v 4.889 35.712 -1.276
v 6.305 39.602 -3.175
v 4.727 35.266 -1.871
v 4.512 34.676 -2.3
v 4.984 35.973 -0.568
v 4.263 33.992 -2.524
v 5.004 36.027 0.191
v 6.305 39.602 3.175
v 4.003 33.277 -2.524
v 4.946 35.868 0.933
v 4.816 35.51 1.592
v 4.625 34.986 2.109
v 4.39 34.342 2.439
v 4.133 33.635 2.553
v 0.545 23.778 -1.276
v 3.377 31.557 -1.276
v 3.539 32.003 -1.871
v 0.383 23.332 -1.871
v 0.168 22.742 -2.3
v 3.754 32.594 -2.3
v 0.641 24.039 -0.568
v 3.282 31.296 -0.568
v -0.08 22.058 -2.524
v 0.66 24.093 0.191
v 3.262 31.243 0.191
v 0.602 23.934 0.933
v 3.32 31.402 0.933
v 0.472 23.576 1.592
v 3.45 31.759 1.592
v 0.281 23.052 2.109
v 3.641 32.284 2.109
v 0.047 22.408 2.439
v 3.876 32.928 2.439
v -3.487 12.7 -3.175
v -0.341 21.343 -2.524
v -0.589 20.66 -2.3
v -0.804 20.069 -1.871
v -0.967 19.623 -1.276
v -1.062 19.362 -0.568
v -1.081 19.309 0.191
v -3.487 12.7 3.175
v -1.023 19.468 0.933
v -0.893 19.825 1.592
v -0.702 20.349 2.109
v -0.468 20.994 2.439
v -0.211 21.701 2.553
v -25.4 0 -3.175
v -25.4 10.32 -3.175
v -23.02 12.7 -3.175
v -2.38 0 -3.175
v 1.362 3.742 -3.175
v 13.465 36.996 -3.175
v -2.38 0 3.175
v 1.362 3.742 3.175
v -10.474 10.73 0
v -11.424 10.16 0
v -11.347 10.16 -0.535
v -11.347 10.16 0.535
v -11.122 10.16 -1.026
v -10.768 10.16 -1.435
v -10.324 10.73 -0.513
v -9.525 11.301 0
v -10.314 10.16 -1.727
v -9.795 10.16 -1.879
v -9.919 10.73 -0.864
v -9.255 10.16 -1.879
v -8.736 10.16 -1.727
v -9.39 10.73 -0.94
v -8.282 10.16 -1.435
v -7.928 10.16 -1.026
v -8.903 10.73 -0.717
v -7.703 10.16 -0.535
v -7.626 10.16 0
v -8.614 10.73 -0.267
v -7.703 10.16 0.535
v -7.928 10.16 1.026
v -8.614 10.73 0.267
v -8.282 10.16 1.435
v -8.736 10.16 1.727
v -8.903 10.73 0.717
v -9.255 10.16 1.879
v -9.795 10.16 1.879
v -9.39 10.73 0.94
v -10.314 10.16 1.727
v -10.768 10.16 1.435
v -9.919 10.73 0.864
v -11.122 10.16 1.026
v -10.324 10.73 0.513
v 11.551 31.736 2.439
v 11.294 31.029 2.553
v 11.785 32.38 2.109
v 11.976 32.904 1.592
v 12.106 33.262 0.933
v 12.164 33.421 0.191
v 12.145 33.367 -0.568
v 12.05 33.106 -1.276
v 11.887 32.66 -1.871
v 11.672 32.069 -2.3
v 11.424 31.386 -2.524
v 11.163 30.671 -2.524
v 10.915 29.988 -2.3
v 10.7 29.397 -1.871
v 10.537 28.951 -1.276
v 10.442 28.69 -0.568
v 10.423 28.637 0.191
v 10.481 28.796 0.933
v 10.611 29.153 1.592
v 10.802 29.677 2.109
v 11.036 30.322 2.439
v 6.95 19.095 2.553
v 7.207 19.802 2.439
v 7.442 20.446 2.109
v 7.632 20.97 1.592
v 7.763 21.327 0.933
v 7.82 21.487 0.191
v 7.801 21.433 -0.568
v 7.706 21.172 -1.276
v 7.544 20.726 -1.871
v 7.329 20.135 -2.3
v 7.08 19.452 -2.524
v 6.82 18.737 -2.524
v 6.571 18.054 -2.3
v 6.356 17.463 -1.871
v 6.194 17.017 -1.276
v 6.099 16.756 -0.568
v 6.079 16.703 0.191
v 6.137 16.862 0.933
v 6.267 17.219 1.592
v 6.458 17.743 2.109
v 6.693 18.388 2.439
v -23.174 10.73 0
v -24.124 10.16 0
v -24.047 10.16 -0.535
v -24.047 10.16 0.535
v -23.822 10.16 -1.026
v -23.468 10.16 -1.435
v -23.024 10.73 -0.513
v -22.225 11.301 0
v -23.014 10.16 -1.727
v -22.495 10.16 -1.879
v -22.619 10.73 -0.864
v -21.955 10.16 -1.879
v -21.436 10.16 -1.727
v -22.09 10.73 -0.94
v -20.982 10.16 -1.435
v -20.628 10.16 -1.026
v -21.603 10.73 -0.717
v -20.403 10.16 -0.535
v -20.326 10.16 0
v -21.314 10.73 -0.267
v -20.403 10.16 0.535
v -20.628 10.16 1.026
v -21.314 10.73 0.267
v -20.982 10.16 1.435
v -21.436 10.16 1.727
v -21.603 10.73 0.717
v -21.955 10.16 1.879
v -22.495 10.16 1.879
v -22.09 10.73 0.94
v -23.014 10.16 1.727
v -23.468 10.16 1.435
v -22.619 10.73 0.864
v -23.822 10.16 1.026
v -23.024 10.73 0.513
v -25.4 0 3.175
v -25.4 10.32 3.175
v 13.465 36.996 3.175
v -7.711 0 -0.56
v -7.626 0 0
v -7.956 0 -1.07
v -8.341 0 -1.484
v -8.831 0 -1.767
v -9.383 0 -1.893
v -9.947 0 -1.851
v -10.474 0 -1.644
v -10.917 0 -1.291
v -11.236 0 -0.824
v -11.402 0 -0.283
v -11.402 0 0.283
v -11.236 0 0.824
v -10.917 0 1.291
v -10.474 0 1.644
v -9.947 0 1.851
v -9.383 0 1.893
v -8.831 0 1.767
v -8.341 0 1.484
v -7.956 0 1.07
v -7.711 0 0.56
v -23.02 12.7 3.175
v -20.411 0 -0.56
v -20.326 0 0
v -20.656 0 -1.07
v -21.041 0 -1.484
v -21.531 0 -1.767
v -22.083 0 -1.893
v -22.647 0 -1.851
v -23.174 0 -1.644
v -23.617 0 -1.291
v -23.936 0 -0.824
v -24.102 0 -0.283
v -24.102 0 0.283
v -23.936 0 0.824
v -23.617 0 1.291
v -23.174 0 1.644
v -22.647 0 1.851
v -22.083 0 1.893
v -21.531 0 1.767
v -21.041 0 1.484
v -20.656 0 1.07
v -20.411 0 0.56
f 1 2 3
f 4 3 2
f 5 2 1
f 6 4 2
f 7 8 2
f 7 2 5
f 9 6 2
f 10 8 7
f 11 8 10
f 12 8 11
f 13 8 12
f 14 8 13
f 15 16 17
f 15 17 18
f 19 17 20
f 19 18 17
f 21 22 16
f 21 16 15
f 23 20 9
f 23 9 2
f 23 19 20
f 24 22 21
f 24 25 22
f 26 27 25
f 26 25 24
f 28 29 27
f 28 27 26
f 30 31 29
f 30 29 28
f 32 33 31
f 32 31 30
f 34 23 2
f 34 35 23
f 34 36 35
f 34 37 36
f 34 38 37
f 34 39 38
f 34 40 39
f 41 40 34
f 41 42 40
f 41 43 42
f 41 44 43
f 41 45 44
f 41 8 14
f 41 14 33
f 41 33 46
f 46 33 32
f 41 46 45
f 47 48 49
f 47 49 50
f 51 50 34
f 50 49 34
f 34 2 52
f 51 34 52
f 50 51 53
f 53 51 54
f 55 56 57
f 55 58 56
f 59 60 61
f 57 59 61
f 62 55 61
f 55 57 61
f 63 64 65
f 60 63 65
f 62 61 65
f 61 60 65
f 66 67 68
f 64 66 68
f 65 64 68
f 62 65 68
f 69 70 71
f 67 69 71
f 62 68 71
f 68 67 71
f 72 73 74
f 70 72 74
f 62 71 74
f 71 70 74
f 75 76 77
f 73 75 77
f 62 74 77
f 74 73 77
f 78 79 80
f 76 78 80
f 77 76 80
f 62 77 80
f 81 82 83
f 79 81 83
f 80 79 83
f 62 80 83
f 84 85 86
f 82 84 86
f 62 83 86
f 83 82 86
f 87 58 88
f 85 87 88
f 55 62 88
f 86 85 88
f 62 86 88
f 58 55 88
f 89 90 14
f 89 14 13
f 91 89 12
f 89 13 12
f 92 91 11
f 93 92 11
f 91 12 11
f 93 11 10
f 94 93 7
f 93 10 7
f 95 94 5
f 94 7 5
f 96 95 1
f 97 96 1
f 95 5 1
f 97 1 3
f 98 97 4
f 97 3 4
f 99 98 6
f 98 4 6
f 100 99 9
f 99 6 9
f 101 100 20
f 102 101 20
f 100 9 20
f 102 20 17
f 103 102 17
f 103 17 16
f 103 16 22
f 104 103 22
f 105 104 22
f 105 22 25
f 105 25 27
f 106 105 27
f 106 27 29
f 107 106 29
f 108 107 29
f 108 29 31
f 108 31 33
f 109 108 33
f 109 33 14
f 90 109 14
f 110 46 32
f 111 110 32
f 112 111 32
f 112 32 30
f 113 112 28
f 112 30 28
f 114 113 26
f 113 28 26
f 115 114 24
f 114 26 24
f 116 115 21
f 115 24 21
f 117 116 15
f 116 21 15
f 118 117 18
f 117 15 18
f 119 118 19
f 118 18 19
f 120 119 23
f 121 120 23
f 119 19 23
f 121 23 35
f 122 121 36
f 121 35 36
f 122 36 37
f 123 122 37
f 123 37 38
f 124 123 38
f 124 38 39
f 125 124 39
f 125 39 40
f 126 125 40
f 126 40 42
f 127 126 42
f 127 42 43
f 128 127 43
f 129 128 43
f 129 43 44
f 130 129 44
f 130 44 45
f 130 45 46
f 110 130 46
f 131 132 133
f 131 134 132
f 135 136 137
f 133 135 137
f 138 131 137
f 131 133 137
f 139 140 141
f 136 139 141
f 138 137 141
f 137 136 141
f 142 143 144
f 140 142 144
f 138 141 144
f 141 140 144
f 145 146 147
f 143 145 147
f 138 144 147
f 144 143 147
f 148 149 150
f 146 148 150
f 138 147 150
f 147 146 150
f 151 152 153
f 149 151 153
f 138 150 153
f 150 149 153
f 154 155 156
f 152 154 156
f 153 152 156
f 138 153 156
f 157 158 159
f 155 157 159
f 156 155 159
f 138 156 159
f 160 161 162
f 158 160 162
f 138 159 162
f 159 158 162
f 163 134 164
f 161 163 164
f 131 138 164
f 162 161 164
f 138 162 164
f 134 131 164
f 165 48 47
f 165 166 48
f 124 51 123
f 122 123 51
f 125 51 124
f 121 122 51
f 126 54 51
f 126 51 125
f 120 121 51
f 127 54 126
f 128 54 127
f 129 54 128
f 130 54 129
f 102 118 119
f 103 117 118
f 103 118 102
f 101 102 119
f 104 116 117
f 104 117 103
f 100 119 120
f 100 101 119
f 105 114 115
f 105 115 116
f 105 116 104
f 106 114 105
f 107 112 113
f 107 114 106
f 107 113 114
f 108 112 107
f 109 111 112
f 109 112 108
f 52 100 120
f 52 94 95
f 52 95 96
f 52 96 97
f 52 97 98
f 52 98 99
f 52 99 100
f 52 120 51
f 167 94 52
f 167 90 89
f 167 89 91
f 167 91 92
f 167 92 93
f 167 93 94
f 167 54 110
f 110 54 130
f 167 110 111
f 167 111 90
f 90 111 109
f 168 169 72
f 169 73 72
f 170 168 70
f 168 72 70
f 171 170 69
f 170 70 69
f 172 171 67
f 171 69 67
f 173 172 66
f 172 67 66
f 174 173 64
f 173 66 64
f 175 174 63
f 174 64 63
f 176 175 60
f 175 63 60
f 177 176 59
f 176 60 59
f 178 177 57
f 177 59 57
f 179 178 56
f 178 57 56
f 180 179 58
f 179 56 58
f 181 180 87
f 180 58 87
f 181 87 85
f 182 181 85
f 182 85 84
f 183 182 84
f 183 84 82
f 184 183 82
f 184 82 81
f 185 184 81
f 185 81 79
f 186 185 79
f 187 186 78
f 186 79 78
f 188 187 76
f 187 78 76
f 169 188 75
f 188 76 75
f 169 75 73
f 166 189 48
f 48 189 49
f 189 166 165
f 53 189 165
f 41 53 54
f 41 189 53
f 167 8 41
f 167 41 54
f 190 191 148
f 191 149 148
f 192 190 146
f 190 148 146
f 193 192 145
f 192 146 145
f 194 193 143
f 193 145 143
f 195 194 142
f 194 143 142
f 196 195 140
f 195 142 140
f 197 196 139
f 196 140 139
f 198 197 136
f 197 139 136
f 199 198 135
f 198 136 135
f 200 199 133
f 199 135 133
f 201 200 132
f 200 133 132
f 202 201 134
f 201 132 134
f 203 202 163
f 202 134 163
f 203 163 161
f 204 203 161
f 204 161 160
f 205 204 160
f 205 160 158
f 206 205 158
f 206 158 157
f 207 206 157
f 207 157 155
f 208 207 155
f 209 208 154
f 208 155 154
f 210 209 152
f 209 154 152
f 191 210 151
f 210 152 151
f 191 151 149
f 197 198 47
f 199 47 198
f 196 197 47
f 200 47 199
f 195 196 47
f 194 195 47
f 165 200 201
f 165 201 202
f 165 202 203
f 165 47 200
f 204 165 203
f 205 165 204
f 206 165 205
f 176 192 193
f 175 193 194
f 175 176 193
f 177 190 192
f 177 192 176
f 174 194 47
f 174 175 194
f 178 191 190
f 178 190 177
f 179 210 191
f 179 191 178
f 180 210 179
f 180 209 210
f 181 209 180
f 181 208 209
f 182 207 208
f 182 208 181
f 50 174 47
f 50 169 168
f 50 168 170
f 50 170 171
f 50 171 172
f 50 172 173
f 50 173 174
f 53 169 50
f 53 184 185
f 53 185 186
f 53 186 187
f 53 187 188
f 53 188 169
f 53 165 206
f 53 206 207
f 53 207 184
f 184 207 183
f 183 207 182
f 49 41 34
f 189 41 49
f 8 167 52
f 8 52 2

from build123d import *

# Parameters (mm, degrees)
BOSS_EXTRUDE1_DEPTH            = 3.175
TAP_DRILL_FOR_10_24_TAP1_D     = 3.7973
TAP_DRILL_FOR_10_24_TAP1_DEPTH = 10.16
TAP_DRILL_FOR_10_24_TAP1_TIP   = 1.140824014
CHAMFER1_SIZE                  = 2.38
CHAMFER1_EDGE_2_SIZE2          = 3.982114101
CHAMFER1_EDGE_2_SIZE           = 2.38
F_10_CLEARANCE_HOLE1_D         = 5.1054
F_10_CLEARANCE_HOLE1_DEPTH     = 12.7
F_10_CLEARANCE_HOLE1_TIP       = 1.533816902


with BuildPart() as part:
    # Sketch1 → Boss-Extrude1 (new body, symmetric)
    with BuildSketch(Plane.XY):
        Polygon((-25.4, 0), (0, 0), (13.465333043, 36.99569848), (6.304875272, 39.601891972), (-3.486612651, 12.7), (-25.4, 12.7), align=None)
    extrude(amount=BOSS_EXTRUDE1_DEPTH, both=True)

    # Tap Drill for #10-24 Tap1
    with Locations(Plane(origin=(0, 0, 0), x_dir=(-1, 0, 0), z_dir=(0, -1, 0))):
        with Locations((22.225, 0), (9.525, 0)):
            Hole(TAP_DRILL_FOR_10_24_TAP1_D / 2, depth=TAP_DRILL_FOR_10_24_TAP1_DEPTH)
            with Locations((0, 0, -(TAP_DRILL_FOR_10_24_TAP1_DEPTH + TAP_DRILL_FOR_10_24_TAP1_TIP / 2))):  # 118° drill point
                Cone(0, TAP_DRILL_FOR_10_24_TAP1_D / 2, TAP_DRILL_FOR_10_24_TAP1_TIP, mode=Mode.SUBTRACT)

    # Chamfer1
    chamfer1_edges = [part.edges().sort_by_distance(p)[0] for p in [
        (-25.4, 12.7, 0),
    ]]
    chamfer(chamfer1_edges, length=CHAMFER1_SIZE)

    # Chamfer1 edge 2
    chamfer1_edge_2_edges = [part.edges().sort_by_distance(p)[0] for p in [
        (0, 0, 0),
    ]]
    chamfer(chamfer1_edge_2_edges, length=CHAMFER1_EDGE_2_SIZE, length2=CHAMFER1_EDGE_2_SIZE2)

    # #10 Clearance Hole1
    with Locations(Plane(origin=(0, 0, 0), x_dir=(0, 0, -1), z_dir=(0.939692621, -0.342020143, 0))):
        with Locations((0, 33.02), (0, 20.32)):
            Hole(F_10_CLEARANCE_HOLE1_D / 2, depth=F_10_CLEARANCE_HOLE1_DEPTH)
            with Locations((0, 0, -(F_10_CLEARANCE_HOLE1_DEPTH + F_10_CLEARANCE_HOLE1_TIP / 2))):  # 118° drill point
                Cone(0, F_10_CLEARANCE_HOLE1_D / 2, F_10_CLEARANCE_HOLE1_TIP, mode=Mode.SUBTRACT)


solid = part.part
